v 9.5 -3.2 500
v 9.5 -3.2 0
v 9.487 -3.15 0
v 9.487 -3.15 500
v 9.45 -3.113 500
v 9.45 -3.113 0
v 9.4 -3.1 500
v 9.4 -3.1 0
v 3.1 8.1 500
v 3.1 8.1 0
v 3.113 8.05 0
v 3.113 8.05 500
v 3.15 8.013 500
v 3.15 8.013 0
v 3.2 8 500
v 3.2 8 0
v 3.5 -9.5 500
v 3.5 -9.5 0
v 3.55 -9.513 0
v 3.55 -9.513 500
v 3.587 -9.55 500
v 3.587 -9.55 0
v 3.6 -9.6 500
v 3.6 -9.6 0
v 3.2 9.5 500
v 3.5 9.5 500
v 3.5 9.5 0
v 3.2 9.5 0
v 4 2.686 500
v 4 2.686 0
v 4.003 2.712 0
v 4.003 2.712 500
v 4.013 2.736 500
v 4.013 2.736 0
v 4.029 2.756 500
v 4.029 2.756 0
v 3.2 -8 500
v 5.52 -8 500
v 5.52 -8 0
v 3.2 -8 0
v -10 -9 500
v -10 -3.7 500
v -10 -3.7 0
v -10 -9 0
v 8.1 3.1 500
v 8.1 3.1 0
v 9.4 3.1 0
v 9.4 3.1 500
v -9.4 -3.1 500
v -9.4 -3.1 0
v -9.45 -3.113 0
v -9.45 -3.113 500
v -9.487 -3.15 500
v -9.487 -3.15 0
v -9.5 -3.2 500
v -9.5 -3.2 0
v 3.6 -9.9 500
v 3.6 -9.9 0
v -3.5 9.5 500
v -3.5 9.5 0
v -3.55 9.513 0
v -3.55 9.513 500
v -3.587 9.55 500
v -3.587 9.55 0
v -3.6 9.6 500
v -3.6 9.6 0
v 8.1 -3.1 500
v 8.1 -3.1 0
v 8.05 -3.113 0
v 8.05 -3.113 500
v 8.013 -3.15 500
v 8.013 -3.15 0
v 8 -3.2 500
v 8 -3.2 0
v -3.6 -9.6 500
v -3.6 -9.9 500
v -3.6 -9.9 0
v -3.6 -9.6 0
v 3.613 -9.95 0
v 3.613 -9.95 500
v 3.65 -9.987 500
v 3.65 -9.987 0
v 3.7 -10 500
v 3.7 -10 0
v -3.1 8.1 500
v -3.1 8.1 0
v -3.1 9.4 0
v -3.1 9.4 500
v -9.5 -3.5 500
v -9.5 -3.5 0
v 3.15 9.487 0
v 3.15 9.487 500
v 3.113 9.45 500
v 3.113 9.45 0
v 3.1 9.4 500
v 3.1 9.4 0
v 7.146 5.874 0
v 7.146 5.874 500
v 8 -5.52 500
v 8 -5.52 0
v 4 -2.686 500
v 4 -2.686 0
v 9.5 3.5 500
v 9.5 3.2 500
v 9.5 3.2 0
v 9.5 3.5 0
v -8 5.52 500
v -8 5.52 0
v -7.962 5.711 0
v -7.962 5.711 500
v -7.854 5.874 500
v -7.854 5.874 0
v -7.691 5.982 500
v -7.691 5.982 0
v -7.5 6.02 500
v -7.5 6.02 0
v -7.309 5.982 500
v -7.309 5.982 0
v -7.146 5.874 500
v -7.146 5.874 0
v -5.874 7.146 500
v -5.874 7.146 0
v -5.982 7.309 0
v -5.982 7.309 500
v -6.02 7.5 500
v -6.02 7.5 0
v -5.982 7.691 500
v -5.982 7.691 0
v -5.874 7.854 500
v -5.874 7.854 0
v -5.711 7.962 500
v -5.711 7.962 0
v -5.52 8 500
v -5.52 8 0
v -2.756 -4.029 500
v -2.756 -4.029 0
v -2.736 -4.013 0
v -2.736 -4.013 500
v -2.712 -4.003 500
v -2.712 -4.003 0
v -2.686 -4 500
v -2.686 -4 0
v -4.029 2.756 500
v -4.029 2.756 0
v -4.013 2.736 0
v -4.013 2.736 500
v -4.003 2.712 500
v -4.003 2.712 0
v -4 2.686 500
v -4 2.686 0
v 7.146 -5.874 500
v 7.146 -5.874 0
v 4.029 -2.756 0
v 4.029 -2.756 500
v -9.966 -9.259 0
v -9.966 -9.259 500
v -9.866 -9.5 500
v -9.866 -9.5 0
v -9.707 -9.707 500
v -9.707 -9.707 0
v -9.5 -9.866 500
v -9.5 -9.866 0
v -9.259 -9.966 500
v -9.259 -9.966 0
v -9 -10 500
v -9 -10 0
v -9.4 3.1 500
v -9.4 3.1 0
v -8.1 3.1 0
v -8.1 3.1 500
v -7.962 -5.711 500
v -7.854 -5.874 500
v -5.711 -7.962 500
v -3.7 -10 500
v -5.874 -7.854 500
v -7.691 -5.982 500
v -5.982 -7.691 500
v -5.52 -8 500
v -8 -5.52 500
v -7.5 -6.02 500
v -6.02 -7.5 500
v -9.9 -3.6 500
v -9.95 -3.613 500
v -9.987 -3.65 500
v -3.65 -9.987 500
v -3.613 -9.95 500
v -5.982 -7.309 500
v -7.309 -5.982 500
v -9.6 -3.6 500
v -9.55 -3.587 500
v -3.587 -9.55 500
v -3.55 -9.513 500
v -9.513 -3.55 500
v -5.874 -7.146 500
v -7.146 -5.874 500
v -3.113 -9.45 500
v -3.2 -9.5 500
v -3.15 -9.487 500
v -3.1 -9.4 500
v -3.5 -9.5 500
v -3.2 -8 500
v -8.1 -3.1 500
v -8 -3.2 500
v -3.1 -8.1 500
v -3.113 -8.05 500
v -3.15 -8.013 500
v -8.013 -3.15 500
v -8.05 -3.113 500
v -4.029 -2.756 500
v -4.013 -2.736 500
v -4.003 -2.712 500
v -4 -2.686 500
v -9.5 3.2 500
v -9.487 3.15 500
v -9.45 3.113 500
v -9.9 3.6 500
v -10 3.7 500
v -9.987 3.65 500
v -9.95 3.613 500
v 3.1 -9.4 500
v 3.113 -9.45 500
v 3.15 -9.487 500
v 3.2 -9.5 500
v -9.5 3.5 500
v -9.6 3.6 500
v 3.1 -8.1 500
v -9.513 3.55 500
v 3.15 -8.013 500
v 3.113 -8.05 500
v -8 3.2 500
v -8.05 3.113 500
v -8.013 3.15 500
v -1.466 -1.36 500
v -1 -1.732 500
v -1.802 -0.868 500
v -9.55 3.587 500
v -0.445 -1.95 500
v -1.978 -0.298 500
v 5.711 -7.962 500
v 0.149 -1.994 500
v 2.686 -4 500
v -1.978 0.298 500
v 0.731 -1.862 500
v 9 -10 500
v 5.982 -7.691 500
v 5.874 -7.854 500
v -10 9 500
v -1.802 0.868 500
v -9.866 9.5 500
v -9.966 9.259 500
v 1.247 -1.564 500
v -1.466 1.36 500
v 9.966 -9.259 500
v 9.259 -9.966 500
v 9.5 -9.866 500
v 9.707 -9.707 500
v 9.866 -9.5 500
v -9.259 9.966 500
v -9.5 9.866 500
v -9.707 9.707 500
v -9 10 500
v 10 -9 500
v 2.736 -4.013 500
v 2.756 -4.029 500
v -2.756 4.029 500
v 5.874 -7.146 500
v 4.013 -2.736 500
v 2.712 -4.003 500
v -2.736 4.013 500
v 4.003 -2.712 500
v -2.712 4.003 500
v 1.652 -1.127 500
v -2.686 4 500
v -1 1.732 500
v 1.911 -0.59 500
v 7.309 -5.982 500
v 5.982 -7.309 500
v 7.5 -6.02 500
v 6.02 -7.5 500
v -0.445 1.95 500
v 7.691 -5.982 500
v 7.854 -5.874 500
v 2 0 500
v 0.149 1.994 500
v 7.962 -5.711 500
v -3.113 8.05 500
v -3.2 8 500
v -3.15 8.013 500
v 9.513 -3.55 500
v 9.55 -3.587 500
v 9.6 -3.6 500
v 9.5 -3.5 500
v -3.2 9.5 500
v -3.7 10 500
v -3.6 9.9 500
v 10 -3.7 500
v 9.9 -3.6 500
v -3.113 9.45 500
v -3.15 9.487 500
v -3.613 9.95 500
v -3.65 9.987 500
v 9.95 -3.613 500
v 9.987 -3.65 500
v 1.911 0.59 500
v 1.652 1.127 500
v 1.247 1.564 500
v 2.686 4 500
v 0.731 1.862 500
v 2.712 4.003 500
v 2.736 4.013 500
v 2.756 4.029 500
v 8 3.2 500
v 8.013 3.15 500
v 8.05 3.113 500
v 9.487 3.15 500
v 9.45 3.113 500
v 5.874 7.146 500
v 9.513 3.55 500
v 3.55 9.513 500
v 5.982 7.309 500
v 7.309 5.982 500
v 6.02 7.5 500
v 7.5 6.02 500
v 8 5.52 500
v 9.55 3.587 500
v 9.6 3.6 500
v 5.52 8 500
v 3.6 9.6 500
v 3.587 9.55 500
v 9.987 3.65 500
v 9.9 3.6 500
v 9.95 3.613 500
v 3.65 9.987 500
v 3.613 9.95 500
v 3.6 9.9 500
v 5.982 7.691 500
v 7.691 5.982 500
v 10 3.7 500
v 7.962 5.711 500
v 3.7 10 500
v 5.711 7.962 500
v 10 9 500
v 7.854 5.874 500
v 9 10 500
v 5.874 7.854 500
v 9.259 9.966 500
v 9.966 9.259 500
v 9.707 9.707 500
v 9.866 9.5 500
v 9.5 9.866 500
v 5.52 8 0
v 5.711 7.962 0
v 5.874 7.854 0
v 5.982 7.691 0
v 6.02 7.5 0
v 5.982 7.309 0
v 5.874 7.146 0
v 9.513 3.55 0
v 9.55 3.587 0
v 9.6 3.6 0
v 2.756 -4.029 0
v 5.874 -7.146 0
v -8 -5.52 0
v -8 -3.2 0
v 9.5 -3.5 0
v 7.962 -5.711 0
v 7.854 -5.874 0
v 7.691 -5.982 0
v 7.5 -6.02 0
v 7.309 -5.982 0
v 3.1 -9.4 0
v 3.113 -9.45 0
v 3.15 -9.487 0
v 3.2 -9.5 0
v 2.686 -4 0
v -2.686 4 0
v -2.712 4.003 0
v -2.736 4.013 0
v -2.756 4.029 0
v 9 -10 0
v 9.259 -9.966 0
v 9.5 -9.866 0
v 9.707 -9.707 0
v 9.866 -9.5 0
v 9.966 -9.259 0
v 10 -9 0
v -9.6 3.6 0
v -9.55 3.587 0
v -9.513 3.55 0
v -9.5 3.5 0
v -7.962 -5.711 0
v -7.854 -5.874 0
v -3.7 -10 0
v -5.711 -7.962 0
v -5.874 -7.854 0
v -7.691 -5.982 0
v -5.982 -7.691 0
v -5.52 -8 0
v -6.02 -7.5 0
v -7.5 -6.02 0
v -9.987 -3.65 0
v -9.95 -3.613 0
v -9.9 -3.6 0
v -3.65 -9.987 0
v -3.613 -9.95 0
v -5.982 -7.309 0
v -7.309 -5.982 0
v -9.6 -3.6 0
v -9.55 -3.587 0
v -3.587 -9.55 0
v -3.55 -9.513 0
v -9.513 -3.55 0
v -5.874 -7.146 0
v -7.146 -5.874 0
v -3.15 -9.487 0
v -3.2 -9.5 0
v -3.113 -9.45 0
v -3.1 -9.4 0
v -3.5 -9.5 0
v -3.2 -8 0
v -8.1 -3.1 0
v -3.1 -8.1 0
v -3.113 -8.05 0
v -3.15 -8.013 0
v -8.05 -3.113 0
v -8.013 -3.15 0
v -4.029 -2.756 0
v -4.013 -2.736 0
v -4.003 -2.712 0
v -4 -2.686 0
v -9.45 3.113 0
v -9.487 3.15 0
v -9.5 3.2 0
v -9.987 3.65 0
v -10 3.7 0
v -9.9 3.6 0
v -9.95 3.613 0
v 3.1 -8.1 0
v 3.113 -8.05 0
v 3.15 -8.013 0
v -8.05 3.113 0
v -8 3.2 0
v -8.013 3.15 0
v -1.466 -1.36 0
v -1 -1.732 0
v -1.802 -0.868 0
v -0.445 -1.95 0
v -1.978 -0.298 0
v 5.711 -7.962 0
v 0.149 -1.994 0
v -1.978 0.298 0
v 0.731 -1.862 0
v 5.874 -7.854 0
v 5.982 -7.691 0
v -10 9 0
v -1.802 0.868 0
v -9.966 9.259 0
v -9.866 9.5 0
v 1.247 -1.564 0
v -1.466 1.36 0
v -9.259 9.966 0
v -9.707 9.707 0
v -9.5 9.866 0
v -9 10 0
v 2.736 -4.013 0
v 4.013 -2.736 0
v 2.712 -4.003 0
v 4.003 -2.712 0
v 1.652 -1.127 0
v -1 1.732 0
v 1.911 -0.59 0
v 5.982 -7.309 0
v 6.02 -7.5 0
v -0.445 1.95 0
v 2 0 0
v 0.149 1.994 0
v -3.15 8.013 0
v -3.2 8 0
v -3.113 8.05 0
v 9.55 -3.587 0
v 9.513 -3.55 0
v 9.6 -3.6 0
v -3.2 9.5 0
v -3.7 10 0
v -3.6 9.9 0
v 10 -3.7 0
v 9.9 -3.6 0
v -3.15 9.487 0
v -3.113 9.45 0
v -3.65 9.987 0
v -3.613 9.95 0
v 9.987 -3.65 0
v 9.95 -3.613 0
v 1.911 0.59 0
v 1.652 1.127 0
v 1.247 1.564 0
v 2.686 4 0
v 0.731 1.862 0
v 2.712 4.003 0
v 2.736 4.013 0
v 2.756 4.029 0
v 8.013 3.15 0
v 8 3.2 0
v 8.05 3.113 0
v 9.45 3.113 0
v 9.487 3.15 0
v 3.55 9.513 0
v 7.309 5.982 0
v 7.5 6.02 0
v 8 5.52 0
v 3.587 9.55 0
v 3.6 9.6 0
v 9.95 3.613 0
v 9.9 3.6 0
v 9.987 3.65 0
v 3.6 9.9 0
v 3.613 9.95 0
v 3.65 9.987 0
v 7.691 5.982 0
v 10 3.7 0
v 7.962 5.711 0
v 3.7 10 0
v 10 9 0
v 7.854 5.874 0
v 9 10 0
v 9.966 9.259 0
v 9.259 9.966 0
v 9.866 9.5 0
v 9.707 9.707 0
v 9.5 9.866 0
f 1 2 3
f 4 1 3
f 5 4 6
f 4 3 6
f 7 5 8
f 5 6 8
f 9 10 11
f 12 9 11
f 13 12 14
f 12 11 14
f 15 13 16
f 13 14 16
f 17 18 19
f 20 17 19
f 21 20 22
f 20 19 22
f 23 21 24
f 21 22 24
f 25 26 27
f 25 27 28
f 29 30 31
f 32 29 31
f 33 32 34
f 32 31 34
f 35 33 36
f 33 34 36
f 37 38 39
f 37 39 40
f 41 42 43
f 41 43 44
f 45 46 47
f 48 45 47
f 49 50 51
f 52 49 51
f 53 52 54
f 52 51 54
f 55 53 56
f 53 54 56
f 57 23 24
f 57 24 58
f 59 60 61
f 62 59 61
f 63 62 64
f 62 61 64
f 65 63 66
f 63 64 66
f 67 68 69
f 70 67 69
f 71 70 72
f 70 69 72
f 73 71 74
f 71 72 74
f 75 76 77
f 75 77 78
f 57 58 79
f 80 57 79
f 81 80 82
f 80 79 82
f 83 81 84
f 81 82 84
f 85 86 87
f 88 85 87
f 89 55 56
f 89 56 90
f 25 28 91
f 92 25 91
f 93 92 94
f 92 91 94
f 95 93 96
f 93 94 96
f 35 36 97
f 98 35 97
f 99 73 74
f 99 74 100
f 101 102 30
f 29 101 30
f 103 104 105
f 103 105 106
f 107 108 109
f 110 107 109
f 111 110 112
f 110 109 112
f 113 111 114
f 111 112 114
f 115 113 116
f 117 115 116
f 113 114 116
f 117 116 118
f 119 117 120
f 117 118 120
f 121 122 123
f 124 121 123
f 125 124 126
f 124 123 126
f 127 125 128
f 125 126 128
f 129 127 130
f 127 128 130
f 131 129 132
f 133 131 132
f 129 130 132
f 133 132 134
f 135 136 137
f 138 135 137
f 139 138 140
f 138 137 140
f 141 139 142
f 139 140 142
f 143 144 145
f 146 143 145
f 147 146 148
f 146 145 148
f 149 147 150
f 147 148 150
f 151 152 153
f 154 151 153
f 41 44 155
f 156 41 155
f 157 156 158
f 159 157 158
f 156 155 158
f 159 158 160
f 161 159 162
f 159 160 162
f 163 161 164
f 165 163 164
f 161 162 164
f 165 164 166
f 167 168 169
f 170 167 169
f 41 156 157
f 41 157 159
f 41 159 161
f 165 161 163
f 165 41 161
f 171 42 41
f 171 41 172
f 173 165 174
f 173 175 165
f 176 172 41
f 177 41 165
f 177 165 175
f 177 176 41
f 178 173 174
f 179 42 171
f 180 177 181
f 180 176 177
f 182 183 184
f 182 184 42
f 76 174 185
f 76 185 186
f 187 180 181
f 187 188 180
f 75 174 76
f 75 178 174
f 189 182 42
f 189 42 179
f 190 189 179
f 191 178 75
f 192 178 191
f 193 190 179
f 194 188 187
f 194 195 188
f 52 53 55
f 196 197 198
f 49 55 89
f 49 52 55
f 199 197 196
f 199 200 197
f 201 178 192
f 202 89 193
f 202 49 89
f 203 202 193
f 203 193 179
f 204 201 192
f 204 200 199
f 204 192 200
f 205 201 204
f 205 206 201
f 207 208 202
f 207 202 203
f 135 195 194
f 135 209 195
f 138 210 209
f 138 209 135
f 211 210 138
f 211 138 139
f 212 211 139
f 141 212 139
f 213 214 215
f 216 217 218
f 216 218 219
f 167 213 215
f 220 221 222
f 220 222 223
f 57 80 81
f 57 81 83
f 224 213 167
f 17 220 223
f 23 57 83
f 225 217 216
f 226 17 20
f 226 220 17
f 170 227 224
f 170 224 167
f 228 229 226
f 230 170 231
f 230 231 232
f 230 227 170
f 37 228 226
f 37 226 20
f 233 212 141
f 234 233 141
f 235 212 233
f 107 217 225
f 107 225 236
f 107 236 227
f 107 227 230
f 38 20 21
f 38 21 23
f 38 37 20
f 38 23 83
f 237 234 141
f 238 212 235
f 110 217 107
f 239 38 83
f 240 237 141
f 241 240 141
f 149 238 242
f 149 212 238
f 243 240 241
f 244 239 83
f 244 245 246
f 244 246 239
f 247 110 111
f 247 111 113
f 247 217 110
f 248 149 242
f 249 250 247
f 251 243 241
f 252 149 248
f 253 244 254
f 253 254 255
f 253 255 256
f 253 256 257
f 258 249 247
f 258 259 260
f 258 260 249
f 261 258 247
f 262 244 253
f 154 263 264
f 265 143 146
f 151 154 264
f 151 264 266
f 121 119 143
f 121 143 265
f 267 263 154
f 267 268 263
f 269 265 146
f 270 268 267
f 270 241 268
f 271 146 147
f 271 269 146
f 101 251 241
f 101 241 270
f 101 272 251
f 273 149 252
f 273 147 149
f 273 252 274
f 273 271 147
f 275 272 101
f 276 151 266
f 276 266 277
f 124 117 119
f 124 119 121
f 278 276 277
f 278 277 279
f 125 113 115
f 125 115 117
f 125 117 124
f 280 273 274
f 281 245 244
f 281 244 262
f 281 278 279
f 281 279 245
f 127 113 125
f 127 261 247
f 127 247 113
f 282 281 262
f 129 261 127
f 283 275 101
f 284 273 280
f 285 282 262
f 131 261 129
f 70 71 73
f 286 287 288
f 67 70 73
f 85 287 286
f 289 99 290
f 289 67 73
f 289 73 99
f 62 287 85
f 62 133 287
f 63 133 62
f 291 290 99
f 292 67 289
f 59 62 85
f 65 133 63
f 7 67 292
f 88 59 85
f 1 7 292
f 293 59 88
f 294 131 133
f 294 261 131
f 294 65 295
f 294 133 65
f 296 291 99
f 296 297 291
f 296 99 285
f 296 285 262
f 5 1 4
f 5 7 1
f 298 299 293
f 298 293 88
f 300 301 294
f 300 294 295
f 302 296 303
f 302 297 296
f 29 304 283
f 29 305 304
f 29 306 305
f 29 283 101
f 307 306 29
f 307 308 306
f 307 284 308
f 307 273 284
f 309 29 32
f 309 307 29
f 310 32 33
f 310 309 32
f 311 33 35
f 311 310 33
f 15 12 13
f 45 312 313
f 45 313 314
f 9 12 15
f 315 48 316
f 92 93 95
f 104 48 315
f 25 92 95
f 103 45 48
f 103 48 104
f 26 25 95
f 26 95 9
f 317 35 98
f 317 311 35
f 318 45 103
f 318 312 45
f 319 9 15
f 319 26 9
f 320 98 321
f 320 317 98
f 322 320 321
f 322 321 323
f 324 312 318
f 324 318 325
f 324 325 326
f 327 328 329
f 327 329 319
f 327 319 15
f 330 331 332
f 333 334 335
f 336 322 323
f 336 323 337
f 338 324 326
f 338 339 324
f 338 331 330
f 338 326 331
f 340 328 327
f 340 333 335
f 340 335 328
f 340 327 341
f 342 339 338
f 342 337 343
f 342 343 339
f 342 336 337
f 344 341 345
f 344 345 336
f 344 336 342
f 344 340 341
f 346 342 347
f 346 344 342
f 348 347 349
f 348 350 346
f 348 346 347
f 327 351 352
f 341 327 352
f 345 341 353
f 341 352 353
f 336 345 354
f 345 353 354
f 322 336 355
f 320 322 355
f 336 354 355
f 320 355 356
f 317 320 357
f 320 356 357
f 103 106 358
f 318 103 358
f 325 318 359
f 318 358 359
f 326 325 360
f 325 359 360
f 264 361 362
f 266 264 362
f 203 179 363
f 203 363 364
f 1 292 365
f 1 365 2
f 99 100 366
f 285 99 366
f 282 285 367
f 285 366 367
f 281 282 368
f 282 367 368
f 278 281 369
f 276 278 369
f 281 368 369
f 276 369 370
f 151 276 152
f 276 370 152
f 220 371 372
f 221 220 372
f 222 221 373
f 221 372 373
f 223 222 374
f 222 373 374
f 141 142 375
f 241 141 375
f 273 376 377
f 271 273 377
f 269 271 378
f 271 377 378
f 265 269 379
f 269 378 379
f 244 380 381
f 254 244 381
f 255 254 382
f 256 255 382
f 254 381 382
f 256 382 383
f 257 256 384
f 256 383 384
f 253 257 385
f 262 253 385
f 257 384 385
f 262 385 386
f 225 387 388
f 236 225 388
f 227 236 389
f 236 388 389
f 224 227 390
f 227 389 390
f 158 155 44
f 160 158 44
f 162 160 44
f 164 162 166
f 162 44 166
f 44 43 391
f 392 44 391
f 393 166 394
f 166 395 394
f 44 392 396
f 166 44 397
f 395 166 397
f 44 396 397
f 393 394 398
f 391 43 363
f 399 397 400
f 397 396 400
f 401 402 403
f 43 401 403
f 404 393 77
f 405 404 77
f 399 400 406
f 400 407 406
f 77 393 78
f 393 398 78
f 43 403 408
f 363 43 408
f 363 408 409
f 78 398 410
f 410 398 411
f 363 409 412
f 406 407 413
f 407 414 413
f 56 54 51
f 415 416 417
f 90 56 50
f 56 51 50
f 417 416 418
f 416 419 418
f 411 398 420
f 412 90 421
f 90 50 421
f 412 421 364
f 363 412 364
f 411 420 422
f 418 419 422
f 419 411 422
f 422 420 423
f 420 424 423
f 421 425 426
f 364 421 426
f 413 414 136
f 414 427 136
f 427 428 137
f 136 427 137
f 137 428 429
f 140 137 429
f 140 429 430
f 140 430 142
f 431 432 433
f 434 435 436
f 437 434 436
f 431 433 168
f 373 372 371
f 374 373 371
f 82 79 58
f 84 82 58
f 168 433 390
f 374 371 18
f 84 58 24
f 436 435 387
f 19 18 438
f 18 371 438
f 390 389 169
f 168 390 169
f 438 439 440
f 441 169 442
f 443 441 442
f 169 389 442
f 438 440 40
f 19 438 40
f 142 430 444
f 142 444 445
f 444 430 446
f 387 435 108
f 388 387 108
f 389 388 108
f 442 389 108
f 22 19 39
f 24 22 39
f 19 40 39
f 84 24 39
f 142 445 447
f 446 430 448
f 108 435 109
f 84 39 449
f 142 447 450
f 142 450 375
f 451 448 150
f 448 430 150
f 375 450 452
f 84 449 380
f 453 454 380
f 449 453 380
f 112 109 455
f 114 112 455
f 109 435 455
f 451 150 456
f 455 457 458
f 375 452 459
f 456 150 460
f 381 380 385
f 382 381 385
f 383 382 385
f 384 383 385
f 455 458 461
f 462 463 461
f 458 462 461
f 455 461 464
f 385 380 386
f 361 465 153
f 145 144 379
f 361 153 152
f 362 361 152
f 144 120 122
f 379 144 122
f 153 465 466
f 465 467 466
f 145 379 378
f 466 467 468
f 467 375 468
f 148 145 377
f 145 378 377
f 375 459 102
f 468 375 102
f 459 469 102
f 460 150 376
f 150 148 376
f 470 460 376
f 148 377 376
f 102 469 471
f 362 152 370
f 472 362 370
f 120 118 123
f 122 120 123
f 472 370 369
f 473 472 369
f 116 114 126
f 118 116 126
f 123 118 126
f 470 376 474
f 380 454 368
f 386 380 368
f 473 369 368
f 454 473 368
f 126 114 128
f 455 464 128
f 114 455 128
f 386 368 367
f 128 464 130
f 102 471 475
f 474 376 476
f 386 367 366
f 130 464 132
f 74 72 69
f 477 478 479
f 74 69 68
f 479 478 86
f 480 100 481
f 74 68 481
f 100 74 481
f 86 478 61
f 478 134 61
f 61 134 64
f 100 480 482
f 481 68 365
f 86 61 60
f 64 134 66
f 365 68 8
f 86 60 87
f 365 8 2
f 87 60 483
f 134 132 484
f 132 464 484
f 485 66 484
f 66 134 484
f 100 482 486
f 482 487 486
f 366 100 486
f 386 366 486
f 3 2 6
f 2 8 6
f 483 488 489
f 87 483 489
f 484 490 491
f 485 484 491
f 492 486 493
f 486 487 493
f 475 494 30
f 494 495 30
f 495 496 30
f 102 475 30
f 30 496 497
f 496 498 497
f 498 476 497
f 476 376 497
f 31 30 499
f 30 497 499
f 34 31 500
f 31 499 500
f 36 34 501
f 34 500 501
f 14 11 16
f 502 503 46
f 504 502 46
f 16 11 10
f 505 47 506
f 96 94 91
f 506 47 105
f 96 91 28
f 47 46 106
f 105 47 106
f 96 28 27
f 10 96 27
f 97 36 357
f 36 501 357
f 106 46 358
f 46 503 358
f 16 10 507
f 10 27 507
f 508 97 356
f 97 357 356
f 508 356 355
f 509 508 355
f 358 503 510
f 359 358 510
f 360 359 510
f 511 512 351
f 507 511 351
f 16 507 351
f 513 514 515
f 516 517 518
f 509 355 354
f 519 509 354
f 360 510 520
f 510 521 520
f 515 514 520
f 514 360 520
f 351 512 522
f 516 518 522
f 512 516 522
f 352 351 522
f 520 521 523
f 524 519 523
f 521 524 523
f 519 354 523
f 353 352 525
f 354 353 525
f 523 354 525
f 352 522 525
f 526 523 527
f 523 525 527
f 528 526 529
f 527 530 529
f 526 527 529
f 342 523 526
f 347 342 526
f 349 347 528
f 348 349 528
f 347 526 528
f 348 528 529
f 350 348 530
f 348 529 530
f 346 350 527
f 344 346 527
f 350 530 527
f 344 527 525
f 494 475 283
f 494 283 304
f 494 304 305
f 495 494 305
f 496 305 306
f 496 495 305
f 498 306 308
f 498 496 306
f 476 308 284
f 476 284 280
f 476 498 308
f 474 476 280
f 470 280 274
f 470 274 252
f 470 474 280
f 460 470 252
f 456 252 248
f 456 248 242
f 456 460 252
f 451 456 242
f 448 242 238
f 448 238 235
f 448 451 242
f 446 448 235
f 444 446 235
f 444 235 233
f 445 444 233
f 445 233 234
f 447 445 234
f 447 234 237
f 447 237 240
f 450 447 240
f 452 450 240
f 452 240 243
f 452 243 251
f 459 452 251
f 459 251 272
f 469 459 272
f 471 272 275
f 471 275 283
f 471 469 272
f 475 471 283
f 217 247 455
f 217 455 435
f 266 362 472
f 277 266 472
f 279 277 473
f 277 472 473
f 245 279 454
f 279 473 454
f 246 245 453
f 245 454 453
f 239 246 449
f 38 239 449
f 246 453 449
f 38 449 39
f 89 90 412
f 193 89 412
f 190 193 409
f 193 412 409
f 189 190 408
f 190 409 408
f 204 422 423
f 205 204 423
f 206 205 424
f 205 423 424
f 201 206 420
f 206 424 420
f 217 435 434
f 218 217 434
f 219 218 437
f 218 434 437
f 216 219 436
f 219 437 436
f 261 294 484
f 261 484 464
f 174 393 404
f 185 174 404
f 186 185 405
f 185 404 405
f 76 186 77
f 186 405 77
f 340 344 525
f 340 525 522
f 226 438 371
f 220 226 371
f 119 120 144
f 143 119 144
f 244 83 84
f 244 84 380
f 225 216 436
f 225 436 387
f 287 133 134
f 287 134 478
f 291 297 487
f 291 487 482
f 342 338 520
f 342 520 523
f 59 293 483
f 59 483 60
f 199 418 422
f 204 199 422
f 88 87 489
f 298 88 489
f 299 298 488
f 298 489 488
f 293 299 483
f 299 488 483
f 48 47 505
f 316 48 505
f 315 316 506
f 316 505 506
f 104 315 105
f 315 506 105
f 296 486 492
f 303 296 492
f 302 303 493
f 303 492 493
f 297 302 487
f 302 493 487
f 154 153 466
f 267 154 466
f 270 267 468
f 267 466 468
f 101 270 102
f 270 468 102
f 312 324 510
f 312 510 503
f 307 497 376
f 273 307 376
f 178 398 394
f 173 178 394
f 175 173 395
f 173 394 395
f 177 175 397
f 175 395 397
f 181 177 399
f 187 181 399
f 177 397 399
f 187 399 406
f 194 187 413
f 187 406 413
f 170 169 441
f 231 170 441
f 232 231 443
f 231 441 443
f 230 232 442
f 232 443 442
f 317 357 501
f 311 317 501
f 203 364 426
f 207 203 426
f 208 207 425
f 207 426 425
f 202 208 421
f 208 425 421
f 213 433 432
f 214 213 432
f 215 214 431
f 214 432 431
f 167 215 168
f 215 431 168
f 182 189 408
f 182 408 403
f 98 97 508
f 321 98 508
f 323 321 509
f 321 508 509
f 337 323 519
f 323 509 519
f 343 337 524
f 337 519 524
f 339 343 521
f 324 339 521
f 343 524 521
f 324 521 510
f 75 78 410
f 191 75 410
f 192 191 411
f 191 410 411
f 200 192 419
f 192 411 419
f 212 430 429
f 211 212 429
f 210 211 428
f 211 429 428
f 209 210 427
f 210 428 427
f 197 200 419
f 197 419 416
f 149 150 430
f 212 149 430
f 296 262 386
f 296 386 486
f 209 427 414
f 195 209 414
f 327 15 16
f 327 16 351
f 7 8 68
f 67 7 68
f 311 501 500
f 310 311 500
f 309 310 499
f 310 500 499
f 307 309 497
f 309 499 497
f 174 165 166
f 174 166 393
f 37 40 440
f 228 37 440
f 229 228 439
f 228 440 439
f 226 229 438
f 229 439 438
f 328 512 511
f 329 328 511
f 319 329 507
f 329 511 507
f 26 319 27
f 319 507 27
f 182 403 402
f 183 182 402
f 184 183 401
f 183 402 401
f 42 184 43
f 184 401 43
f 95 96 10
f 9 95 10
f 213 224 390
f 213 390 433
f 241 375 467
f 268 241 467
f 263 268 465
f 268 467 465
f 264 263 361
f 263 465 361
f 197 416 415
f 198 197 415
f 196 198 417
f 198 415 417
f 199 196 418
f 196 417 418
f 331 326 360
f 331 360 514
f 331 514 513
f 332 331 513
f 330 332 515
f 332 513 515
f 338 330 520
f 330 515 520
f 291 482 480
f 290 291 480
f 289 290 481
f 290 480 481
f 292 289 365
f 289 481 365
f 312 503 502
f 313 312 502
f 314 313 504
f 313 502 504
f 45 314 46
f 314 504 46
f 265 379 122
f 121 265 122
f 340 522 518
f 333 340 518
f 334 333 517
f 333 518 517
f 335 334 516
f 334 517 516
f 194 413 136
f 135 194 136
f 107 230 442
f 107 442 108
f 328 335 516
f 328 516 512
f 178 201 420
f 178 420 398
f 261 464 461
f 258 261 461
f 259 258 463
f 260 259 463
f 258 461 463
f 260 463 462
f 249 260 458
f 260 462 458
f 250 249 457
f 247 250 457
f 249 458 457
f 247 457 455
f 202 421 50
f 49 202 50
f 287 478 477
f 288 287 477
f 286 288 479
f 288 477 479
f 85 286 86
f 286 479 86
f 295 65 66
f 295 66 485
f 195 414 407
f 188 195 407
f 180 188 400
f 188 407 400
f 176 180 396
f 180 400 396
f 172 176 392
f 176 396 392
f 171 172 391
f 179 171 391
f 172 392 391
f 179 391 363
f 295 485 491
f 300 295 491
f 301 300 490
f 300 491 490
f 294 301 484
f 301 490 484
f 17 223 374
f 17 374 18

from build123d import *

# Parameters (mm, degrees)
SKETCH1_R           = 2
BOSS_EXTRUDE1_DEPTH = 500


with BuildPart() as part:
    # Sketch1 → Boss-Extrude1 (new body)
    with BuildSketch(Plane.XY):
        with BuildLine():
            Line((-10, 9), (-10, 3.7))
            ThreePointArc((-10, 3.7), (-9.970710678, 3.629289322), (-9.9, 3.6))
            Line((-9.9, 3.6), (-9.6, 3.6))
            ThreePointArc((-9.6, 3.6), (-9.529289322, 3.570710678), (-9.5, 3.5))
            Line((-9.5, 3.5), (-9.5, 3.2))
            ThreePointArc((-9.5, 3.2), (-9.470710678, 3.129289322), (-9.4, 3.1))
            Line((-9.4, 3.1), (-8.1, 3.1))
            ThreePointArc((-8.1, 3.1), (-8.029289322, 3.129289322), (-8, 3.2))
            Line((-8, 3.2), (-8, 5.520101013))
            ThreePointArc((-8, 5.520101013), (-7.691341716, 5.982040779), (-7.146446609, 5.873654403))
            Line((-7.146446609, 5.873654403), (-4.029289322, 2.756497116))
            ThreePointArc((-4.029289322, 2.756497116), (-4.007612047, 2.724054781), (-4, 2.685786438))
            Line((-4, 2.685786438), (-4, 0))
            Line((-4, 0), (-4, -2.685786438))
            ThreePointArc((-4, -2.685786438), (-4.007612047, -2.724054781), (-4.029289322, -2.756497116))
            Line((-4.029289322, -2.756497116), (-7.146446609, -5.873654403))
            ThreePointArc((-7.146446609, -5.873654403), (-7.691341716, -5.982040779), (-8, -5.520101013))
            Line((-8, -5.520101013), (-8, -3.2))
            ThreePointArc((-8, -3.2), (-8.029289322, -3.129289322), (-8.1, -3.1))
            Line((-8.1, -3.1), (-9.4, -3.1))
            ThreePointArc((-9.4, -3.1), (-9.470710678, -3.129289322), (-9.5, -3.2))
            Line((-9.5, -3.2), (-9.5, -3.5))
            ThreePointArc((-9.5, -3.5), (-9.529289322, -3.570710678), (-9.6, -3.6))
            Line((-9.6, -3.6), (-9.9, -3.6))
            ThreePointArc((-9.9, -3.6), (-9.970710678, -3.629289322), (-10, -3.7))
            Line((-10, -3.7), (-10, -9))
            ThreePointArc((-10, -9), (-9.707106781, -9.707106781), (-9, -10))
            Line((-9, -10), (-3.7, -10))
            ThreePointArc((-3.7, -10), (-3.629289322, -9.970710678), (-3.6, -9.9))
            Line((-3.6, -9.9), (-3.6, -9.6))
            ThreePointArc((-3.6, -9.6), (-3.570710678, -9.529289322), (-3.5, -9.5))
            Line((-3.5, -9.5), (-3.2, -9.5))
            ThreePointArc((-3.2, -9.5), (-3.129289322, -9.470710678), (-3.1, -9.4))
            Line((-3.1, -9.4), (-3.1, -8.1))
            ThreePointArc((-3.1, -8.1), (-3.129289322, -8.029289322), (-3.2, -8))
            Line((-3.2, -8), (-5.520101013, -8))
            ThreePointArc((-5.520101013, -8), (-5.982040779, -7.691341716), (-5.873654403, -7.146446609))
            Line((-5.873654403, -7.146446609), (-2.756497116, -4.029289322))
            ThreePointArc((-2.756497116, -4.029289322), (-2.724054781, -4.007612047), (-2.685786438, -4))
            Line((-2.685786438, -4), (2.685786438, -4))
            ThreePointArc((2.685786438, -4), (2.724054781, -4.007612047), (2.756497116, -4.029289322))
            Line((2.756497116, -4.029289322), (5.873654403, -7.146446609))
            ThreePointArc((5.873654403, -7.146446609), (5.982040779, -7.691341716), (5.520101013, -8))
            Line((5.520101013, -8), (3.2, -8))
            ThreePointArc((3.2, -8), (3.129289322, -8.029289322), (3.1, -8.1))
            Line((3.1, -8.1), (3.1, -9.4))
            ThreePointArc((3.1, -9.4), (3.129289322, -9.470710678), (3.2, -9.5))
            Line((3.2, -9.5), (3.5, -9.5))
            ThreePointArc((3.5, -9.5), (3.570710678, -9.529289322), (3.6, -9.6))
            Line((3.6, -9.6), (3.6, -9.9))
            ThreePointArc((3.6, -9.9), (3.629289322, -9.970710678), (3.7, -10))
            Line((3.7, -10), (9, -10))
            ThreePointArc((9, -10), (9.707106781, -9.707106781), (10, -9))
            Line((10, -9), (10, -3.7))
            ThreePointArc((10, -3.7), (9.970710678, -3.629289322), (9.9, -3.6))
            Line((9.9, -3.6), (9.6, -3.6))
            ThreePointArc((9.6, -3.6), (9.529289322, -3.570710678), (9.5, -3.5))
            Line((9.5, -3.5), (9.5, -3.2))
            ThreePointArc((9.5, -3.2), (9.470710678, -3.129289322), (9.4, -3.1))
            Line((9.4, -3.1), (8.1, -3.1))
            ThreePointArc((8.1, -3.1), (8.029289322, -3.129289322), (8, -3.2))
            Line((8, -3.2), (8, -5.520101013))
            ThreePointArc((8, -5.520101013), (7.691341716, -5.982040779), (7.146446609, -5.873654403))
            Line((7.146446609, -5.873654403), (4.029289322, -2.756497116))
            ThreePointArc((4.029289322, -2.756497116), (4.007612047, -2.724054781), (4, -2.685786438))
            Line((4, -2.685786438), (4, 0))
            Line((4, 0), (4, 2.685786438))
            ThreePointArc((4, 2.685786438), (4.007612047, 2.724054781), (4.029289322, 2.756497116))
            Line((4.029289322, 2.756497116), (7.146446609, 5.873654403))
            ThreePointArc((7.146446609, 5.873654403), (7.691341716, 5.982040779), (8, 5.520101013))
            Line((8, 5.520101013), (8, 3.2))
            ThreePointArc((8, 3.2), (8.029289322, 3.129289322), (8.1, 3.1))
            Line((8.1, 3.1), (9.4, 3.1))
            ThreePointArc((9.4, 3.1), (9.470710678, 3.129289322), (9.5, 3.2))
            Line((9.5, 3.2), (9.5, 3.5))
            ThreePointArc((9.5, 3.5), (9.529289322, 3.570710678), (9.6, 3.6))
            Line((9.6, 3.6), (9.9, 3.6))
            ThreePointArc((9.9, 3.6), (9.970710678, 3.629289322), (10, 3.7))
            Line((10, 3.7), (10, 9))
            ThreePointArc((10, 9), (9.707106781, 9.707106781), (9, 10))
            Line((9, 10), (3.7, 10))
            ThreePointArc((3.7, 10), (3.629289322, 9.970710678), (3.6, 9.9))
            Line((3.6, 9.9), (3.6, 9.6))
            ThreePointArc((3.6, 9.6), (3.570710678, 9.529289322), (3.5, 9.5))
            Line((3.5, 9.5), (3.2, 9.5))
            ThreePointArc((3.2, 9.5), (3.129289322, 9.470710678), (3.1, 9.4))
            Line((3.1, 9.4), (3.1, 8.1))
            ThreePointArc((3.1, 8.1), (3.129289322, 8.029289322), (3.2, 8))
            Line((3.2, 8), (5.520101013, 8))
            ThreePointArc((5.520101013, 8), (5.982040779, 7.691341716), (5.873654403, 7.146446609))
            Line((5.873654403, 7.146446609), (2.756497116, 4.029289322))
            ThreePointArc((2.756497116, 4.029289322), (2.724054781, 4.007612047), (2.685786438, 4))
            Line((2.685786438, 4), (-2.685786438, 4))
            ThreePointArc((-2.685786438, 4), (-2.724054781, 4.007612047), (-2.756497116, 4.029289322))
            Line((-2.756497116, 4.029289322), (-5.873654403, 7.146446609))
            ThreePointArc((-5.873654403, 7.146446609), (-5.982040779, 7.691341716), (-5.520101013, 8))
            Line((-5.520101013, 8), (-3.2, 8))
            ThreePointArc((-3.2, 8), (-3.129289322, 8.029289322), (-3.1, 8.1))
            Line((-3.1, 8.1), (-3.1, 9.4))
            ThreePointArc((-3.1, 9.4), (-3.129289322, 9.470710678), (-3.2, 9.5))
            Line((-3.2, 9.5), (-3.5, 9.5))
            ThreePointArc((-3.5, 9.5), (-3.570710678, 9.529289322), (-3.6, 9.6))
            Line((-3.6, 9.6), (-3.6, 9.9))
            ThreePointArc((-3.6, 9.9), (-3.629289322, 9.970710678), (-3.7, 10))
            Line((-3.7, 10), (-9, 10))
            ThreePointArc((-9, 10), (-9.707106781, 9.707106781), (-10, 9))
        make_face()
        Circle(SKETCH1_R, mode=Mode.SUBTRACT)
    extrude(amount=BOSS_EXTRUDE1_DEPTH)


solid = part.part
